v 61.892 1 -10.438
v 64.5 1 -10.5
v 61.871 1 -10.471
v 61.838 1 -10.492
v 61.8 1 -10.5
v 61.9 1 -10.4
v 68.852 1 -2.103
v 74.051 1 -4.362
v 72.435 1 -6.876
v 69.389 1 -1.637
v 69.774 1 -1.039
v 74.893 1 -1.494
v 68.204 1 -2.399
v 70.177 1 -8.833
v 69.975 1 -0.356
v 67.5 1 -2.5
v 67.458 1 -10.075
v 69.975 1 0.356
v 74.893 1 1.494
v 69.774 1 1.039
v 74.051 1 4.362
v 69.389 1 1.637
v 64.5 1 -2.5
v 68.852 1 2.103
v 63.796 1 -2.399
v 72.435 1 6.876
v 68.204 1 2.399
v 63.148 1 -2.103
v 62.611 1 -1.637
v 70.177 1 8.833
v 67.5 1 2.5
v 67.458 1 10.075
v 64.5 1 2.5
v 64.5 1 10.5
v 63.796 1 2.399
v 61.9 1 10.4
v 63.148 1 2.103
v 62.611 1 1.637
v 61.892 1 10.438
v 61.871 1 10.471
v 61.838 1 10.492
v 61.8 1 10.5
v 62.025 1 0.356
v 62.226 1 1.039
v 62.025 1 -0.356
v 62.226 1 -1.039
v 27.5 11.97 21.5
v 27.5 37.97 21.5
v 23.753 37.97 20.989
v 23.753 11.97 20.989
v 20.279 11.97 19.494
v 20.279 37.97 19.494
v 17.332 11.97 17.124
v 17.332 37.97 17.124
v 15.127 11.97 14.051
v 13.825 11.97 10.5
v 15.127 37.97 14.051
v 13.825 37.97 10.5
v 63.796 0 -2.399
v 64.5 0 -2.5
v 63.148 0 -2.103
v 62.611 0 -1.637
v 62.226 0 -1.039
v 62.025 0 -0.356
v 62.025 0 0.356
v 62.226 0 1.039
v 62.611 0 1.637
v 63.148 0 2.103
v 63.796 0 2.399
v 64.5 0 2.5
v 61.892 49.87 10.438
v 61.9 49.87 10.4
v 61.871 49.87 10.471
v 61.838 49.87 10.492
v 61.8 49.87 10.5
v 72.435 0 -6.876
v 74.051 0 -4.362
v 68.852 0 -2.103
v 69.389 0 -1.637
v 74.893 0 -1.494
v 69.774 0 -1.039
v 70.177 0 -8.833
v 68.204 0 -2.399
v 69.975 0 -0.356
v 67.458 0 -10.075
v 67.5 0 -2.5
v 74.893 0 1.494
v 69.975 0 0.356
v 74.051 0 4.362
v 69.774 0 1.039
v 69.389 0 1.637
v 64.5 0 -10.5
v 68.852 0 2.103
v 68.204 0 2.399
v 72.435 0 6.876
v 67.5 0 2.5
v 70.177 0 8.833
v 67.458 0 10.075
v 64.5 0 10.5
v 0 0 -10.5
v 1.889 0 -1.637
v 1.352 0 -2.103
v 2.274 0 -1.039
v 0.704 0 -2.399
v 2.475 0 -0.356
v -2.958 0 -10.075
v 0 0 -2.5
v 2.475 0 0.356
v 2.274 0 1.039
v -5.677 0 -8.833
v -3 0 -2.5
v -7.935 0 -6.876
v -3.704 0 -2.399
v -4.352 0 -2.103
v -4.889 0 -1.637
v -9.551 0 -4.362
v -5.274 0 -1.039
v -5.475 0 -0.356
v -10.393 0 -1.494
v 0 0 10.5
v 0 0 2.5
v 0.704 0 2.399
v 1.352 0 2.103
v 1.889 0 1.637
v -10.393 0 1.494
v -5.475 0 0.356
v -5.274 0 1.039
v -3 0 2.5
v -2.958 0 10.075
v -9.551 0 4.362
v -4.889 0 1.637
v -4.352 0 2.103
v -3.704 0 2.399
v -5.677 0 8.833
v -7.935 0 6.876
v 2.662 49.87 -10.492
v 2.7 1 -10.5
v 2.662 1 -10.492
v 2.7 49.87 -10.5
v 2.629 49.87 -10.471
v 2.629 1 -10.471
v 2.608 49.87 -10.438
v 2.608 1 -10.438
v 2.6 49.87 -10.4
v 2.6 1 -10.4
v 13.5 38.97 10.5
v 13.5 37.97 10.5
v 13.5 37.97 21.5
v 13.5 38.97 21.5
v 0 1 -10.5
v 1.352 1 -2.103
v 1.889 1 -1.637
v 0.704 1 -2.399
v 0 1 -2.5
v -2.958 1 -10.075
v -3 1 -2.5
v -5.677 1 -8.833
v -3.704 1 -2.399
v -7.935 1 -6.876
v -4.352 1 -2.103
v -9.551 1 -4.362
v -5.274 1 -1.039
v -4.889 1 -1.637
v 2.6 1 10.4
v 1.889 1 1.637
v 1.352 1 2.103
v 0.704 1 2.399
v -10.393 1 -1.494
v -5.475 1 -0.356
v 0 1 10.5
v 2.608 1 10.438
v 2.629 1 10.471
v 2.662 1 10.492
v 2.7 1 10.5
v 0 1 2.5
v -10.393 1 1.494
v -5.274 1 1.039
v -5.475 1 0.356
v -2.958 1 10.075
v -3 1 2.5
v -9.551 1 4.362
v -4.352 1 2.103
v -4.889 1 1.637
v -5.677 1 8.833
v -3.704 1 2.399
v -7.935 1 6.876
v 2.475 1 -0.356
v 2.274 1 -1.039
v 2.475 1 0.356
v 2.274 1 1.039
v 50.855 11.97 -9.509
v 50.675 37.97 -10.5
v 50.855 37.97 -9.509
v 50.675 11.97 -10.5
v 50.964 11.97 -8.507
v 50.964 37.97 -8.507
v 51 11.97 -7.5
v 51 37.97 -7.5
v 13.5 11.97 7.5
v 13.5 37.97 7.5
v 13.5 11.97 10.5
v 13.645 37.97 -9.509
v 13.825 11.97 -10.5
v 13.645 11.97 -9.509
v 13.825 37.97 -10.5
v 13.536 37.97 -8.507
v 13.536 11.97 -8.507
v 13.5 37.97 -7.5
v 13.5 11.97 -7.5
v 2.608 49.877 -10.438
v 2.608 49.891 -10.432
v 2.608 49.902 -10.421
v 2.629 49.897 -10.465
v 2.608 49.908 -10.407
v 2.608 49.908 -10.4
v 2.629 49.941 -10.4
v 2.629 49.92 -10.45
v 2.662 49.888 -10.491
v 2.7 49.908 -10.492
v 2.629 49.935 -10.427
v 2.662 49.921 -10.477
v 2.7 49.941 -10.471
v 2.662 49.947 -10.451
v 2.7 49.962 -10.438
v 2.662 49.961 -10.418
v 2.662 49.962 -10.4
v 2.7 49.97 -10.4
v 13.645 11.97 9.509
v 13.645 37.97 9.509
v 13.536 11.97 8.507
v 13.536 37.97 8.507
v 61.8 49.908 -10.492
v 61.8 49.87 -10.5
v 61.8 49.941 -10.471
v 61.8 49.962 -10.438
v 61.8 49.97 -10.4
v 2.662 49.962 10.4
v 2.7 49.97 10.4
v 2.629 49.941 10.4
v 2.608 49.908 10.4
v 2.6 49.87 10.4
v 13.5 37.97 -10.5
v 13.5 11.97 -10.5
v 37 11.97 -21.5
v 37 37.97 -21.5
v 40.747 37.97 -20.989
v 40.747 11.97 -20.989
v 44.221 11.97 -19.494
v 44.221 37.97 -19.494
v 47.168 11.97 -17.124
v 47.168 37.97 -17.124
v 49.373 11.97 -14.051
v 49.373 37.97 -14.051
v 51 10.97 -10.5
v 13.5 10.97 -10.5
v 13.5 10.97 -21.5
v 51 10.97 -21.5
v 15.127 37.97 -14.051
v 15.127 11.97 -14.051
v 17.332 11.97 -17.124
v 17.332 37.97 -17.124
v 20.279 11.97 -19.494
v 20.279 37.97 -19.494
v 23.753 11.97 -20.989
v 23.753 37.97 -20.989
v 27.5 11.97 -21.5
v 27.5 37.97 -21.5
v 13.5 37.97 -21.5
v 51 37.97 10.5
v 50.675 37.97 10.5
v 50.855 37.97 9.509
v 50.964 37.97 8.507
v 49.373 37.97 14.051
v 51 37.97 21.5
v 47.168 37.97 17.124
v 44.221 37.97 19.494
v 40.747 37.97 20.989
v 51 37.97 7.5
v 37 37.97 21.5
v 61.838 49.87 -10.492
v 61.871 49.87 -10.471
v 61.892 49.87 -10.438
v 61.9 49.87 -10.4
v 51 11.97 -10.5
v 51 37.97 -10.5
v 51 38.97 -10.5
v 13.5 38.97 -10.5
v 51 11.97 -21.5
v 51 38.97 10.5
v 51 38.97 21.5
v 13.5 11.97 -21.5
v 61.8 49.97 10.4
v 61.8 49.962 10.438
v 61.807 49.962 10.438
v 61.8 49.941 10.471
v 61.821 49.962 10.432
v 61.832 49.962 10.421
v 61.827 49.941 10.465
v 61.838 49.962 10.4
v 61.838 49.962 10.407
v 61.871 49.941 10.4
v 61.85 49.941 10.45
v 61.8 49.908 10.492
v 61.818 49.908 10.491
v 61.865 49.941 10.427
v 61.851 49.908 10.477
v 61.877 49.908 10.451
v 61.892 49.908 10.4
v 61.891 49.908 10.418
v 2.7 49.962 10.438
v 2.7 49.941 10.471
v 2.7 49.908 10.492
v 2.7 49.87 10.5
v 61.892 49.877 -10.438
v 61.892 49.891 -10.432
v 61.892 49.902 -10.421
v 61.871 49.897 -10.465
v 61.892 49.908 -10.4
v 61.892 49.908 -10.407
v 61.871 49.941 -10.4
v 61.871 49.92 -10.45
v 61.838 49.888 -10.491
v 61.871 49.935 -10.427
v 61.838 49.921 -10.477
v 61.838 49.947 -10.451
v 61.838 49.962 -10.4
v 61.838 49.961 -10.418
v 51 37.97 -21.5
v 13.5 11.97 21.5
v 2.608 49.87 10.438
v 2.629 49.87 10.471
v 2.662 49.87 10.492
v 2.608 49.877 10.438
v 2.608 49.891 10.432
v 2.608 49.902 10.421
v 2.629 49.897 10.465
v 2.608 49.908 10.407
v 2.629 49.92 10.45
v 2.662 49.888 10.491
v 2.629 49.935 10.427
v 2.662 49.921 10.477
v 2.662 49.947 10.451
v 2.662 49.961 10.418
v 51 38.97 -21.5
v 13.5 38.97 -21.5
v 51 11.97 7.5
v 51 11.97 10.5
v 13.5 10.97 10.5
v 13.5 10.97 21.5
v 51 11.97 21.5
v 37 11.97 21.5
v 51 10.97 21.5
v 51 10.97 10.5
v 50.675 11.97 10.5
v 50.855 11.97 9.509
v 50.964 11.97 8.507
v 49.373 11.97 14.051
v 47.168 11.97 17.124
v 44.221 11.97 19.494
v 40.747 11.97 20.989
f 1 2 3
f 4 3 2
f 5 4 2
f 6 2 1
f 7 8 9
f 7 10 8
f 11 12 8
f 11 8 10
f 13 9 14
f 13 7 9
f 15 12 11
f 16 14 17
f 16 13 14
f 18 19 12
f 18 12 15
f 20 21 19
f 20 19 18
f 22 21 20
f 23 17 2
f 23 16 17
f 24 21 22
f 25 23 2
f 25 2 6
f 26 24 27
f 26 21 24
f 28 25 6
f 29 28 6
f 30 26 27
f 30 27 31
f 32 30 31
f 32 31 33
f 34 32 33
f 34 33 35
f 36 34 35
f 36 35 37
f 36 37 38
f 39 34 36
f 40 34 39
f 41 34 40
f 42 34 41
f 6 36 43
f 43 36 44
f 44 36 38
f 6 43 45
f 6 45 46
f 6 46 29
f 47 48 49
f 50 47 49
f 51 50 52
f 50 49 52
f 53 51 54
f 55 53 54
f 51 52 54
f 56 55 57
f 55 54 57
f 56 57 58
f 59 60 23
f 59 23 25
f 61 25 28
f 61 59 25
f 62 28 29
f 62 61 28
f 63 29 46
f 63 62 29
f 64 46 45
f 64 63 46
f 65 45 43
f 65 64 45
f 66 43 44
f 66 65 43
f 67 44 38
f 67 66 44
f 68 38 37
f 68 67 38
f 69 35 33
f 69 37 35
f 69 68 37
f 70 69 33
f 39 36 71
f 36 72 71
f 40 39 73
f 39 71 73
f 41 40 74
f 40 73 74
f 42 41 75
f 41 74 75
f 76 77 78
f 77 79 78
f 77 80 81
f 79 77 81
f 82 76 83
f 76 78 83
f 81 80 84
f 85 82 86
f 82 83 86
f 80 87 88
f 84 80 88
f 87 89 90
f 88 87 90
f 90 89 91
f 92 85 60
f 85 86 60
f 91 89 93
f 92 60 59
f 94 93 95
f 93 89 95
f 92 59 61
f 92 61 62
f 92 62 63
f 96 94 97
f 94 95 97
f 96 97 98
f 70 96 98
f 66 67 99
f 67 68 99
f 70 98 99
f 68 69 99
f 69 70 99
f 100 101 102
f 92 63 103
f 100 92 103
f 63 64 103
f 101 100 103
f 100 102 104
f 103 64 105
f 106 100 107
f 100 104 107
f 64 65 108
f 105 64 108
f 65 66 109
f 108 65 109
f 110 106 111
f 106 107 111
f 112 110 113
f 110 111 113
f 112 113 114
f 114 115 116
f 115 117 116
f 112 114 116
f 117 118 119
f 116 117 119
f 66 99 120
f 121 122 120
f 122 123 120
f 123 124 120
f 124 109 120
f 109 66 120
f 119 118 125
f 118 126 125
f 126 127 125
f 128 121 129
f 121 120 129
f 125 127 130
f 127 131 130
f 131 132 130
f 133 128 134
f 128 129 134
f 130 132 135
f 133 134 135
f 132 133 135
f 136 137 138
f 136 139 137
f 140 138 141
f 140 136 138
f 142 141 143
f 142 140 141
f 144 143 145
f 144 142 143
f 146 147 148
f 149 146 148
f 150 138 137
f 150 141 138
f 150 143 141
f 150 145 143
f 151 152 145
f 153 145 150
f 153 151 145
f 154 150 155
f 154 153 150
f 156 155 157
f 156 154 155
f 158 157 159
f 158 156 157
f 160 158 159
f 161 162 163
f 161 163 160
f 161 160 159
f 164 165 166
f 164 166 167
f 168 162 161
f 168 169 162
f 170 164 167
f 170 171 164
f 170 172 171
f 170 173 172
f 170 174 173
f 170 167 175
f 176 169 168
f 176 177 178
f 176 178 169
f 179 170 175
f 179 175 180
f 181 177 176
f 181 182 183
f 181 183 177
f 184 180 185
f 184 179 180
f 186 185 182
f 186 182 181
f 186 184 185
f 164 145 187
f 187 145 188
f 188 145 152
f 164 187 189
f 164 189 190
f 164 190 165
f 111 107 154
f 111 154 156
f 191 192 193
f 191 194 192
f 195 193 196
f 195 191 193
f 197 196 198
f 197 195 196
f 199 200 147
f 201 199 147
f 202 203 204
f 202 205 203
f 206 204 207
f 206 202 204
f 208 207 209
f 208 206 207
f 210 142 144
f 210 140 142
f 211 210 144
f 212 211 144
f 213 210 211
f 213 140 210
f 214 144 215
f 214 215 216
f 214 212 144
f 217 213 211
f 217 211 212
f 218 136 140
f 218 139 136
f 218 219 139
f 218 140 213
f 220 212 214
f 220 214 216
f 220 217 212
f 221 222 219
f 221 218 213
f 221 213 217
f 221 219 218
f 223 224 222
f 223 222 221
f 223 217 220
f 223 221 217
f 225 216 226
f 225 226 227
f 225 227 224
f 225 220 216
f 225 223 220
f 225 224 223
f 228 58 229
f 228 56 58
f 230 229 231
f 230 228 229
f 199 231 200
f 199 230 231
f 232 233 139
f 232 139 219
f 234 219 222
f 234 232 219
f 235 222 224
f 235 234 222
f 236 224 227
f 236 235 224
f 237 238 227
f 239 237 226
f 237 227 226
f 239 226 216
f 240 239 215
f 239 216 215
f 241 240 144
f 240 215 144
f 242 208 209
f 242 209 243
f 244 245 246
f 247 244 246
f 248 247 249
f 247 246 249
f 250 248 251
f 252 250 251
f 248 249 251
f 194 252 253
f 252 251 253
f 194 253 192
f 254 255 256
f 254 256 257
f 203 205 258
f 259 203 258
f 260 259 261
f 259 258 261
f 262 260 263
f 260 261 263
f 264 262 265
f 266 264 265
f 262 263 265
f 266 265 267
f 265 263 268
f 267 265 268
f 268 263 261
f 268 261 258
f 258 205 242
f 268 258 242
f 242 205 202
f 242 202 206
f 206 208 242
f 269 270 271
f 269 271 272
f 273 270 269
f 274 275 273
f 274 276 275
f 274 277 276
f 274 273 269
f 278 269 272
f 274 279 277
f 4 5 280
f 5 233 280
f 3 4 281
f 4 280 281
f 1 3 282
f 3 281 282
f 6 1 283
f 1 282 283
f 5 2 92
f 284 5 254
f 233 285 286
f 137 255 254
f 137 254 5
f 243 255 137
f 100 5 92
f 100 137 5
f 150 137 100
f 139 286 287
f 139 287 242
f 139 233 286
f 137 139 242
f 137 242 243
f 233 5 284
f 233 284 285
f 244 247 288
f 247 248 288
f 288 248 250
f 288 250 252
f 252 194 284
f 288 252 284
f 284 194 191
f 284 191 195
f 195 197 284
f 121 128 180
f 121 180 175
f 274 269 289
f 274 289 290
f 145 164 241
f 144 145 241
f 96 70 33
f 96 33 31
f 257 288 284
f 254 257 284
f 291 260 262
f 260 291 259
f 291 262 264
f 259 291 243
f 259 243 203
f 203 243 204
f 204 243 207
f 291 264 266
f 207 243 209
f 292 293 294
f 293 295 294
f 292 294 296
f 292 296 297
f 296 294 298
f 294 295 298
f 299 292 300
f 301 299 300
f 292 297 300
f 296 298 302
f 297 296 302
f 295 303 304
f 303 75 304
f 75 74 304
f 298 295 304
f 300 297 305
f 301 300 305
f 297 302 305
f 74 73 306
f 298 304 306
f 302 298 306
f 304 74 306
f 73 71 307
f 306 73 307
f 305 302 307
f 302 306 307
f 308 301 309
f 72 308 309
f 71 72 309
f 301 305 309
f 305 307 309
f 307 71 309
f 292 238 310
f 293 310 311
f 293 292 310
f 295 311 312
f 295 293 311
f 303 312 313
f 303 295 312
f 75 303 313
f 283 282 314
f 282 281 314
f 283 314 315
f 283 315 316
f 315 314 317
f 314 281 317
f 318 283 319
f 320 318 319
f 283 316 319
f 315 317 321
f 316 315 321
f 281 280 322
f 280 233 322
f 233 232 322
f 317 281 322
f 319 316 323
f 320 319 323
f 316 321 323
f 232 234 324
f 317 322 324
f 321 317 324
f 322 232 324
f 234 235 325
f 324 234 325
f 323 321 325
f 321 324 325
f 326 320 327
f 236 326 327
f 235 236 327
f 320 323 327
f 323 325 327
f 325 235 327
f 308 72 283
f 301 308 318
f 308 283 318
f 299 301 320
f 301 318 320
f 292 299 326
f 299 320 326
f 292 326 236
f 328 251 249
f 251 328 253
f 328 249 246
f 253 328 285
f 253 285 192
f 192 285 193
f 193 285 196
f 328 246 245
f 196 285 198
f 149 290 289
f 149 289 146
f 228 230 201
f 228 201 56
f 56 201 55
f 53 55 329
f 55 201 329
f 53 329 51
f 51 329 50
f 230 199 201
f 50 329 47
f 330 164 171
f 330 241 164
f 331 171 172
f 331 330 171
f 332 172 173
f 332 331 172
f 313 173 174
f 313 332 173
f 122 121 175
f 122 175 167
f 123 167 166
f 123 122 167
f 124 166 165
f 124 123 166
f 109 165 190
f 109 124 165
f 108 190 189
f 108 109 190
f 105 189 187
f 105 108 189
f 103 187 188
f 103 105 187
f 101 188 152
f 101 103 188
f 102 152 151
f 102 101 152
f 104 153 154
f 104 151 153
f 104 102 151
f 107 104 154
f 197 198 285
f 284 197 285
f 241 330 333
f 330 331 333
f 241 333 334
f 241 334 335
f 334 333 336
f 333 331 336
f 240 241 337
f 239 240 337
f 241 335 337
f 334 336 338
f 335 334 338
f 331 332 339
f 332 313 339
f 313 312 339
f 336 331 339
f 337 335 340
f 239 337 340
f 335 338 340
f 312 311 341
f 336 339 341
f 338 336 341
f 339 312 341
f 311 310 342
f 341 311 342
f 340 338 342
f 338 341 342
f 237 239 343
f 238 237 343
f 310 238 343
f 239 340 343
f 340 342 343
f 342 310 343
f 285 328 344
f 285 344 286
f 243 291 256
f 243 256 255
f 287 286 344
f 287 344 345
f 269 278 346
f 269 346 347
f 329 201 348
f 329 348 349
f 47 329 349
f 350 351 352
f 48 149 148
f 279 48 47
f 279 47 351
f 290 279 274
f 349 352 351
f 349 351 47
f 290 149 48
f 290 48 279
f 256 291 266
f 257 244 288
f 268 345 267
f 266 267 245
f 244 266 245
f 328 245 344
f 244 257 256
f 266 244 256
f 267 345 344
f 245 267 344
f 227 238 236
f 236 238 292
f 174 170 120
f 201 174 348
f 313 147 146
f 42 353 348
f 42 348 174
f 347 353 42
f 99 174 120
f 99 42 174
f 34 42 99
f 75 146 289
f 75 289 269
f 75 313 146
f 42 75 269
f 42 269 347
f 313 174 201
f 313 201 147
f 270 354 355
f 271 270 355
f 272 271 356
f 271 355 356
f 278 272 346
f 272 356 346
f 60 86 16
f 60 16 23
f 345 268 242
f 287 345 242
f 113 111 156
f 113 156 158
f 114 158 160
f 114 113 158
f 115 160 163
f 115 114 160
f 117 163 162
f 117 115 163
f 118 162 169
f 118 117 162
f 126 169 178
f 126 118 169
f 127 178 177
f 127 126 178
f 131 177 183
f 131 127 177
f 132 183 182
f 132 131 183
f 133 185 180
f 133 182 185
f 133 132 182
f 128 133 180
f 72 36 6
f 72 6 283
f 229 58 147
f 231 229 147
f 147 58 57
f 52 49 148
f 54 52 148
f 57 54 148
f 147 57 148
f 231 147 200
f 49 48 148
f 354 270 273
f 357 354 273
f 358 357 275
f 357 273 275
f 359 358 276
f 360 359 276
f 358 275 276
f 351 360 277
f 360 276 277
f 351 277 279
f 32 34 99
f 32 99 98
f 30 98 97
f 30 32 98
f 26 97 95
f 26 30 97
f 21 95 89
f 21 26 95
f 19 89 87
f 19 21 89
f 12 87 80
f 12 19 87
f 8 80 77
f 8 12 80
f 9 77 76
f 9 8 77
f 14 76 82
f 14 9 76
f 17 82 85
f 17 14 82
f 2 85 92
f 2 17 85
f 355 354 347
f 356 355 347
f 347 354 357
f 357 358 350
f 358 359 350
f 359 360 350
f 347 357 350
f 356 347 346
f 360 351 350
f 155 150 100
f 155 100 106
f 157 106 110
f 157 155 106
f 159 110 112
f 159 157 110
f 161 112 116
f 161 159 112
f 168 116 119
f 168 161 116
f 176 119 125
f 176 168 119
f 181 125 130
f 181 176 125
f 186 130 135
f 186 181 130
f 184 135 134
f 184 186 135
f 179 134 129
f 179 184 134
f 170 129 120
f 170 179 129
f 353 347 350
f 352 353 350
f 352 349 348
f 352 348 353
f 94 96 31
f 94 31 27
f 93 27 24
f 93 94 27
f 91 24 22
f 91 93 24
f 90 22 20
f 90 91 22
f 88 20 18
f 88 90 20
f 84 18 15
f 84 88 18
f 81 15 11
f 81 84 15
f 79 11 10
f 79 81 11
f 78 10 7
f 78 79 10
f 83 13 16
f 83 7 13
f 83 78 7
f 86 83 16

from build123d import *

# Parameters (mm, degrees)
SKETCH1_W           = 59.3
SKETCH1_H           = 48.97
BASE_EXTRUDE_DEPTH  = 10.5
BOSS_EXTRUDE1_DEPTH = 1
CUT_EXTRUDE1_DEPTH  = 10
BOSS_EXTRUDE2_DEPTH = 13
CUT_EXTRUDE2_DEPTH  = 13
SKETCH6_W           = 37.5
SKETCH6_H           = 43
BOSS_EXTRUDE3_DEPTH = 1
SKETCH7_W           = 37.5
SKETCH7_H           = 43
BOSS_EXTRUDE4_DEPTH = 1
FILLET1_R           = 0.1


with BuildPart() as part:
    # Sketch1 → Base-Extrude (new body, symmetric)
    with BuildSketch(Plane.XY):
        with Locations((32.25, 25.485)):
            Rectangle(SKETCH1_W, SKETCH1_H)
    extrude(amount=BASE_EXTRUDE_DEPTH, both=True)

    # Sketch2 → Boss-Extrude1 (add)
    with BuildSketch(Plane.XZ.offset(-1)):
        with BuildLine():
            Line((0, 10.5), (64.5, 10.5))
            ThreePointArc((64.5, 10.5), (75, 0), (64.5, -10.5))
            Line((64.5, -10.5), (0, -10.5))
            ThreePointArc((0, -10.5), (-10.5, 0), (0, 10.5))
        make_face()
    extrude(amount=BOSS_EXTRUDE1_DEPTH)

    # Sketch3 → Cut-Extrude1 (cut)
    with BuildSketch(Plane.XZ):
        with BuildLine():
            Line((64.5, 2.5), (67.5, 2.5))
            ThreePointArc((67.5, 2.5), (70, 0), (67.5, -2.5))
            Line((67.5, -2.5), (64.5, -2.5))
            ThreePointArc((64.5, -2.5), (62, 0), (64.5, 2.5))
        make_face()
        with BuildLine():
            Line((-3, 2.5), (0, 2.5))
            ThreePointArc((0, 2.5), (2.5, 0), (0, -2.5))
            Line((0, -2.5), (-3, -2.5))
            ThreePointArc((-3, -2.5), (-5.5, 0), (-3, 2.5))
        make_face()
    extrude(amount=-CUT_EXTRUDE1_DEPTH, mode=Mode.SUBTRACT)

    # Sketch4 → Boss-Extrude2 (add, symmetric)
    with BuildSketch(Plane(origin=(0, 24.97, 0), x_dir=(-1, 0, 0), z_dir=(0, 1, 0))):
        with BuildLine():
            Line((-37, 21.5), (-27.5, 21.5))
            ThreePointArc((-27.5, 21.5), (-17.600505063, 17.399494937), (-13.5, 7.5))
            Line((-13.5, 7.5), (-13.5, -7.5))
            ThreePointArc((-13.5, -7.5), (-17.600505063, -17.399494937), (-27.5, -21.5))
            Line((-27.5, -21.5), (-37, -21.5))
            ThreePointArc((-37, -21.5), (-46.899494937, -17.399494937), (-51, -7.5))
            Line((-51, -7.5), (-51, 7.5))
            ThreePointArc((-51, 7.5), (-46.899494937, 17.399494937), (-37, 21.5))
        make_face()
    extrude(amount=BOSS_EXTRUDE2_DEPTH, both=True)

    # Sketch5 → Cut-Extrude2 (cut, symmetric)
    with BuildSketch(Plane(origin=(0, 24.97, 0), x_dir=(-1, 0, 0), z_dir=(0, 1, 0))):
        with BuildLine():
            Line((-13.5, 10.5), (-13.825205669, 10.5))
            ThreePointArc((-13.825205669, 10.5), (-13.581538867, 9.008787487), (-13.5, 7.5))
            Line((-13.5, 7.5), (-13.5, 10.5))
        make_face()
        with BuildLine():
            Line((-51, 10.5), (-50.674794331, 10.5))
            ThreePointArc((-50.674794331, 10.5), (-50.918461133, 9.008787487), (-51, 7.5))
            Line((-51, 7.5), (-51, 10.5))
        make_face()
        with BuildLine():
            Line((-51, -10.5), (-50.674794331, -10.5))
            ThreePointArc((-50.674794331, -10.5), (-50.918461133, -9.008787487), (-51, -7.5))
            Line((-51, -7.5), (-51, -10.5))
        make_face()
        with BuildLine():
            Line((-13.5, -10.5), (-13.825205669, -10.5))
            ThreePointArc((-13.825205669, -10.5), (-13.581538867, -9.008787487), (-13.5, -7.5))
            Line((-13.5, -7.5), (-13.5, -10.5))
        make_face()
    extrude(amount=CUT_EXTRUDE2_DEPTH, both=True, mode=Mode.SUBTRACT)

    # Sketch6 → Boss-Extrude3 (add)
    with BuildSketch(Plane(origin=(0, 37.97, 0), x_dir=(-1, 0, 0), z_dir=(0, 1, 0))):
        with Locations((-32.25, 0)):
            Rectangle(SKETCH6_W, SKETCH6_H)
    extrude(amount=BOSS_EXTRUDE3_DEPTH)

    # Sketch7 → Boss-Extrude4 (add)
    with BuildSketch(Plane.XZ.offset(-11.97)):
        with Locations((32.25, 0)):
            Rectangle(SKETCH7_W, SKETCH7_H)
    extrude(amount=BOSS_EXTRUDE4_DEPTH)

    # Fillet1
    fillet1_edges = [part.edges().sort_by_distance(p)[0] for p in [
        (61.9, 25.485, 10.5),
        (32.25, 49.97, 10.5),
        (2.6, 25.485, 10.5),
        (32.25, 49.97, -10.5),
        (61.9, 25.485, -10.5),
        (2.6, 25.485, -10.5),
        (2.6, 49.97, 0),
        (61.9, 49.97, 0),
    ]]
    fillet(fillet1_edges, radius=FILLET1_R)


solid = part.part
